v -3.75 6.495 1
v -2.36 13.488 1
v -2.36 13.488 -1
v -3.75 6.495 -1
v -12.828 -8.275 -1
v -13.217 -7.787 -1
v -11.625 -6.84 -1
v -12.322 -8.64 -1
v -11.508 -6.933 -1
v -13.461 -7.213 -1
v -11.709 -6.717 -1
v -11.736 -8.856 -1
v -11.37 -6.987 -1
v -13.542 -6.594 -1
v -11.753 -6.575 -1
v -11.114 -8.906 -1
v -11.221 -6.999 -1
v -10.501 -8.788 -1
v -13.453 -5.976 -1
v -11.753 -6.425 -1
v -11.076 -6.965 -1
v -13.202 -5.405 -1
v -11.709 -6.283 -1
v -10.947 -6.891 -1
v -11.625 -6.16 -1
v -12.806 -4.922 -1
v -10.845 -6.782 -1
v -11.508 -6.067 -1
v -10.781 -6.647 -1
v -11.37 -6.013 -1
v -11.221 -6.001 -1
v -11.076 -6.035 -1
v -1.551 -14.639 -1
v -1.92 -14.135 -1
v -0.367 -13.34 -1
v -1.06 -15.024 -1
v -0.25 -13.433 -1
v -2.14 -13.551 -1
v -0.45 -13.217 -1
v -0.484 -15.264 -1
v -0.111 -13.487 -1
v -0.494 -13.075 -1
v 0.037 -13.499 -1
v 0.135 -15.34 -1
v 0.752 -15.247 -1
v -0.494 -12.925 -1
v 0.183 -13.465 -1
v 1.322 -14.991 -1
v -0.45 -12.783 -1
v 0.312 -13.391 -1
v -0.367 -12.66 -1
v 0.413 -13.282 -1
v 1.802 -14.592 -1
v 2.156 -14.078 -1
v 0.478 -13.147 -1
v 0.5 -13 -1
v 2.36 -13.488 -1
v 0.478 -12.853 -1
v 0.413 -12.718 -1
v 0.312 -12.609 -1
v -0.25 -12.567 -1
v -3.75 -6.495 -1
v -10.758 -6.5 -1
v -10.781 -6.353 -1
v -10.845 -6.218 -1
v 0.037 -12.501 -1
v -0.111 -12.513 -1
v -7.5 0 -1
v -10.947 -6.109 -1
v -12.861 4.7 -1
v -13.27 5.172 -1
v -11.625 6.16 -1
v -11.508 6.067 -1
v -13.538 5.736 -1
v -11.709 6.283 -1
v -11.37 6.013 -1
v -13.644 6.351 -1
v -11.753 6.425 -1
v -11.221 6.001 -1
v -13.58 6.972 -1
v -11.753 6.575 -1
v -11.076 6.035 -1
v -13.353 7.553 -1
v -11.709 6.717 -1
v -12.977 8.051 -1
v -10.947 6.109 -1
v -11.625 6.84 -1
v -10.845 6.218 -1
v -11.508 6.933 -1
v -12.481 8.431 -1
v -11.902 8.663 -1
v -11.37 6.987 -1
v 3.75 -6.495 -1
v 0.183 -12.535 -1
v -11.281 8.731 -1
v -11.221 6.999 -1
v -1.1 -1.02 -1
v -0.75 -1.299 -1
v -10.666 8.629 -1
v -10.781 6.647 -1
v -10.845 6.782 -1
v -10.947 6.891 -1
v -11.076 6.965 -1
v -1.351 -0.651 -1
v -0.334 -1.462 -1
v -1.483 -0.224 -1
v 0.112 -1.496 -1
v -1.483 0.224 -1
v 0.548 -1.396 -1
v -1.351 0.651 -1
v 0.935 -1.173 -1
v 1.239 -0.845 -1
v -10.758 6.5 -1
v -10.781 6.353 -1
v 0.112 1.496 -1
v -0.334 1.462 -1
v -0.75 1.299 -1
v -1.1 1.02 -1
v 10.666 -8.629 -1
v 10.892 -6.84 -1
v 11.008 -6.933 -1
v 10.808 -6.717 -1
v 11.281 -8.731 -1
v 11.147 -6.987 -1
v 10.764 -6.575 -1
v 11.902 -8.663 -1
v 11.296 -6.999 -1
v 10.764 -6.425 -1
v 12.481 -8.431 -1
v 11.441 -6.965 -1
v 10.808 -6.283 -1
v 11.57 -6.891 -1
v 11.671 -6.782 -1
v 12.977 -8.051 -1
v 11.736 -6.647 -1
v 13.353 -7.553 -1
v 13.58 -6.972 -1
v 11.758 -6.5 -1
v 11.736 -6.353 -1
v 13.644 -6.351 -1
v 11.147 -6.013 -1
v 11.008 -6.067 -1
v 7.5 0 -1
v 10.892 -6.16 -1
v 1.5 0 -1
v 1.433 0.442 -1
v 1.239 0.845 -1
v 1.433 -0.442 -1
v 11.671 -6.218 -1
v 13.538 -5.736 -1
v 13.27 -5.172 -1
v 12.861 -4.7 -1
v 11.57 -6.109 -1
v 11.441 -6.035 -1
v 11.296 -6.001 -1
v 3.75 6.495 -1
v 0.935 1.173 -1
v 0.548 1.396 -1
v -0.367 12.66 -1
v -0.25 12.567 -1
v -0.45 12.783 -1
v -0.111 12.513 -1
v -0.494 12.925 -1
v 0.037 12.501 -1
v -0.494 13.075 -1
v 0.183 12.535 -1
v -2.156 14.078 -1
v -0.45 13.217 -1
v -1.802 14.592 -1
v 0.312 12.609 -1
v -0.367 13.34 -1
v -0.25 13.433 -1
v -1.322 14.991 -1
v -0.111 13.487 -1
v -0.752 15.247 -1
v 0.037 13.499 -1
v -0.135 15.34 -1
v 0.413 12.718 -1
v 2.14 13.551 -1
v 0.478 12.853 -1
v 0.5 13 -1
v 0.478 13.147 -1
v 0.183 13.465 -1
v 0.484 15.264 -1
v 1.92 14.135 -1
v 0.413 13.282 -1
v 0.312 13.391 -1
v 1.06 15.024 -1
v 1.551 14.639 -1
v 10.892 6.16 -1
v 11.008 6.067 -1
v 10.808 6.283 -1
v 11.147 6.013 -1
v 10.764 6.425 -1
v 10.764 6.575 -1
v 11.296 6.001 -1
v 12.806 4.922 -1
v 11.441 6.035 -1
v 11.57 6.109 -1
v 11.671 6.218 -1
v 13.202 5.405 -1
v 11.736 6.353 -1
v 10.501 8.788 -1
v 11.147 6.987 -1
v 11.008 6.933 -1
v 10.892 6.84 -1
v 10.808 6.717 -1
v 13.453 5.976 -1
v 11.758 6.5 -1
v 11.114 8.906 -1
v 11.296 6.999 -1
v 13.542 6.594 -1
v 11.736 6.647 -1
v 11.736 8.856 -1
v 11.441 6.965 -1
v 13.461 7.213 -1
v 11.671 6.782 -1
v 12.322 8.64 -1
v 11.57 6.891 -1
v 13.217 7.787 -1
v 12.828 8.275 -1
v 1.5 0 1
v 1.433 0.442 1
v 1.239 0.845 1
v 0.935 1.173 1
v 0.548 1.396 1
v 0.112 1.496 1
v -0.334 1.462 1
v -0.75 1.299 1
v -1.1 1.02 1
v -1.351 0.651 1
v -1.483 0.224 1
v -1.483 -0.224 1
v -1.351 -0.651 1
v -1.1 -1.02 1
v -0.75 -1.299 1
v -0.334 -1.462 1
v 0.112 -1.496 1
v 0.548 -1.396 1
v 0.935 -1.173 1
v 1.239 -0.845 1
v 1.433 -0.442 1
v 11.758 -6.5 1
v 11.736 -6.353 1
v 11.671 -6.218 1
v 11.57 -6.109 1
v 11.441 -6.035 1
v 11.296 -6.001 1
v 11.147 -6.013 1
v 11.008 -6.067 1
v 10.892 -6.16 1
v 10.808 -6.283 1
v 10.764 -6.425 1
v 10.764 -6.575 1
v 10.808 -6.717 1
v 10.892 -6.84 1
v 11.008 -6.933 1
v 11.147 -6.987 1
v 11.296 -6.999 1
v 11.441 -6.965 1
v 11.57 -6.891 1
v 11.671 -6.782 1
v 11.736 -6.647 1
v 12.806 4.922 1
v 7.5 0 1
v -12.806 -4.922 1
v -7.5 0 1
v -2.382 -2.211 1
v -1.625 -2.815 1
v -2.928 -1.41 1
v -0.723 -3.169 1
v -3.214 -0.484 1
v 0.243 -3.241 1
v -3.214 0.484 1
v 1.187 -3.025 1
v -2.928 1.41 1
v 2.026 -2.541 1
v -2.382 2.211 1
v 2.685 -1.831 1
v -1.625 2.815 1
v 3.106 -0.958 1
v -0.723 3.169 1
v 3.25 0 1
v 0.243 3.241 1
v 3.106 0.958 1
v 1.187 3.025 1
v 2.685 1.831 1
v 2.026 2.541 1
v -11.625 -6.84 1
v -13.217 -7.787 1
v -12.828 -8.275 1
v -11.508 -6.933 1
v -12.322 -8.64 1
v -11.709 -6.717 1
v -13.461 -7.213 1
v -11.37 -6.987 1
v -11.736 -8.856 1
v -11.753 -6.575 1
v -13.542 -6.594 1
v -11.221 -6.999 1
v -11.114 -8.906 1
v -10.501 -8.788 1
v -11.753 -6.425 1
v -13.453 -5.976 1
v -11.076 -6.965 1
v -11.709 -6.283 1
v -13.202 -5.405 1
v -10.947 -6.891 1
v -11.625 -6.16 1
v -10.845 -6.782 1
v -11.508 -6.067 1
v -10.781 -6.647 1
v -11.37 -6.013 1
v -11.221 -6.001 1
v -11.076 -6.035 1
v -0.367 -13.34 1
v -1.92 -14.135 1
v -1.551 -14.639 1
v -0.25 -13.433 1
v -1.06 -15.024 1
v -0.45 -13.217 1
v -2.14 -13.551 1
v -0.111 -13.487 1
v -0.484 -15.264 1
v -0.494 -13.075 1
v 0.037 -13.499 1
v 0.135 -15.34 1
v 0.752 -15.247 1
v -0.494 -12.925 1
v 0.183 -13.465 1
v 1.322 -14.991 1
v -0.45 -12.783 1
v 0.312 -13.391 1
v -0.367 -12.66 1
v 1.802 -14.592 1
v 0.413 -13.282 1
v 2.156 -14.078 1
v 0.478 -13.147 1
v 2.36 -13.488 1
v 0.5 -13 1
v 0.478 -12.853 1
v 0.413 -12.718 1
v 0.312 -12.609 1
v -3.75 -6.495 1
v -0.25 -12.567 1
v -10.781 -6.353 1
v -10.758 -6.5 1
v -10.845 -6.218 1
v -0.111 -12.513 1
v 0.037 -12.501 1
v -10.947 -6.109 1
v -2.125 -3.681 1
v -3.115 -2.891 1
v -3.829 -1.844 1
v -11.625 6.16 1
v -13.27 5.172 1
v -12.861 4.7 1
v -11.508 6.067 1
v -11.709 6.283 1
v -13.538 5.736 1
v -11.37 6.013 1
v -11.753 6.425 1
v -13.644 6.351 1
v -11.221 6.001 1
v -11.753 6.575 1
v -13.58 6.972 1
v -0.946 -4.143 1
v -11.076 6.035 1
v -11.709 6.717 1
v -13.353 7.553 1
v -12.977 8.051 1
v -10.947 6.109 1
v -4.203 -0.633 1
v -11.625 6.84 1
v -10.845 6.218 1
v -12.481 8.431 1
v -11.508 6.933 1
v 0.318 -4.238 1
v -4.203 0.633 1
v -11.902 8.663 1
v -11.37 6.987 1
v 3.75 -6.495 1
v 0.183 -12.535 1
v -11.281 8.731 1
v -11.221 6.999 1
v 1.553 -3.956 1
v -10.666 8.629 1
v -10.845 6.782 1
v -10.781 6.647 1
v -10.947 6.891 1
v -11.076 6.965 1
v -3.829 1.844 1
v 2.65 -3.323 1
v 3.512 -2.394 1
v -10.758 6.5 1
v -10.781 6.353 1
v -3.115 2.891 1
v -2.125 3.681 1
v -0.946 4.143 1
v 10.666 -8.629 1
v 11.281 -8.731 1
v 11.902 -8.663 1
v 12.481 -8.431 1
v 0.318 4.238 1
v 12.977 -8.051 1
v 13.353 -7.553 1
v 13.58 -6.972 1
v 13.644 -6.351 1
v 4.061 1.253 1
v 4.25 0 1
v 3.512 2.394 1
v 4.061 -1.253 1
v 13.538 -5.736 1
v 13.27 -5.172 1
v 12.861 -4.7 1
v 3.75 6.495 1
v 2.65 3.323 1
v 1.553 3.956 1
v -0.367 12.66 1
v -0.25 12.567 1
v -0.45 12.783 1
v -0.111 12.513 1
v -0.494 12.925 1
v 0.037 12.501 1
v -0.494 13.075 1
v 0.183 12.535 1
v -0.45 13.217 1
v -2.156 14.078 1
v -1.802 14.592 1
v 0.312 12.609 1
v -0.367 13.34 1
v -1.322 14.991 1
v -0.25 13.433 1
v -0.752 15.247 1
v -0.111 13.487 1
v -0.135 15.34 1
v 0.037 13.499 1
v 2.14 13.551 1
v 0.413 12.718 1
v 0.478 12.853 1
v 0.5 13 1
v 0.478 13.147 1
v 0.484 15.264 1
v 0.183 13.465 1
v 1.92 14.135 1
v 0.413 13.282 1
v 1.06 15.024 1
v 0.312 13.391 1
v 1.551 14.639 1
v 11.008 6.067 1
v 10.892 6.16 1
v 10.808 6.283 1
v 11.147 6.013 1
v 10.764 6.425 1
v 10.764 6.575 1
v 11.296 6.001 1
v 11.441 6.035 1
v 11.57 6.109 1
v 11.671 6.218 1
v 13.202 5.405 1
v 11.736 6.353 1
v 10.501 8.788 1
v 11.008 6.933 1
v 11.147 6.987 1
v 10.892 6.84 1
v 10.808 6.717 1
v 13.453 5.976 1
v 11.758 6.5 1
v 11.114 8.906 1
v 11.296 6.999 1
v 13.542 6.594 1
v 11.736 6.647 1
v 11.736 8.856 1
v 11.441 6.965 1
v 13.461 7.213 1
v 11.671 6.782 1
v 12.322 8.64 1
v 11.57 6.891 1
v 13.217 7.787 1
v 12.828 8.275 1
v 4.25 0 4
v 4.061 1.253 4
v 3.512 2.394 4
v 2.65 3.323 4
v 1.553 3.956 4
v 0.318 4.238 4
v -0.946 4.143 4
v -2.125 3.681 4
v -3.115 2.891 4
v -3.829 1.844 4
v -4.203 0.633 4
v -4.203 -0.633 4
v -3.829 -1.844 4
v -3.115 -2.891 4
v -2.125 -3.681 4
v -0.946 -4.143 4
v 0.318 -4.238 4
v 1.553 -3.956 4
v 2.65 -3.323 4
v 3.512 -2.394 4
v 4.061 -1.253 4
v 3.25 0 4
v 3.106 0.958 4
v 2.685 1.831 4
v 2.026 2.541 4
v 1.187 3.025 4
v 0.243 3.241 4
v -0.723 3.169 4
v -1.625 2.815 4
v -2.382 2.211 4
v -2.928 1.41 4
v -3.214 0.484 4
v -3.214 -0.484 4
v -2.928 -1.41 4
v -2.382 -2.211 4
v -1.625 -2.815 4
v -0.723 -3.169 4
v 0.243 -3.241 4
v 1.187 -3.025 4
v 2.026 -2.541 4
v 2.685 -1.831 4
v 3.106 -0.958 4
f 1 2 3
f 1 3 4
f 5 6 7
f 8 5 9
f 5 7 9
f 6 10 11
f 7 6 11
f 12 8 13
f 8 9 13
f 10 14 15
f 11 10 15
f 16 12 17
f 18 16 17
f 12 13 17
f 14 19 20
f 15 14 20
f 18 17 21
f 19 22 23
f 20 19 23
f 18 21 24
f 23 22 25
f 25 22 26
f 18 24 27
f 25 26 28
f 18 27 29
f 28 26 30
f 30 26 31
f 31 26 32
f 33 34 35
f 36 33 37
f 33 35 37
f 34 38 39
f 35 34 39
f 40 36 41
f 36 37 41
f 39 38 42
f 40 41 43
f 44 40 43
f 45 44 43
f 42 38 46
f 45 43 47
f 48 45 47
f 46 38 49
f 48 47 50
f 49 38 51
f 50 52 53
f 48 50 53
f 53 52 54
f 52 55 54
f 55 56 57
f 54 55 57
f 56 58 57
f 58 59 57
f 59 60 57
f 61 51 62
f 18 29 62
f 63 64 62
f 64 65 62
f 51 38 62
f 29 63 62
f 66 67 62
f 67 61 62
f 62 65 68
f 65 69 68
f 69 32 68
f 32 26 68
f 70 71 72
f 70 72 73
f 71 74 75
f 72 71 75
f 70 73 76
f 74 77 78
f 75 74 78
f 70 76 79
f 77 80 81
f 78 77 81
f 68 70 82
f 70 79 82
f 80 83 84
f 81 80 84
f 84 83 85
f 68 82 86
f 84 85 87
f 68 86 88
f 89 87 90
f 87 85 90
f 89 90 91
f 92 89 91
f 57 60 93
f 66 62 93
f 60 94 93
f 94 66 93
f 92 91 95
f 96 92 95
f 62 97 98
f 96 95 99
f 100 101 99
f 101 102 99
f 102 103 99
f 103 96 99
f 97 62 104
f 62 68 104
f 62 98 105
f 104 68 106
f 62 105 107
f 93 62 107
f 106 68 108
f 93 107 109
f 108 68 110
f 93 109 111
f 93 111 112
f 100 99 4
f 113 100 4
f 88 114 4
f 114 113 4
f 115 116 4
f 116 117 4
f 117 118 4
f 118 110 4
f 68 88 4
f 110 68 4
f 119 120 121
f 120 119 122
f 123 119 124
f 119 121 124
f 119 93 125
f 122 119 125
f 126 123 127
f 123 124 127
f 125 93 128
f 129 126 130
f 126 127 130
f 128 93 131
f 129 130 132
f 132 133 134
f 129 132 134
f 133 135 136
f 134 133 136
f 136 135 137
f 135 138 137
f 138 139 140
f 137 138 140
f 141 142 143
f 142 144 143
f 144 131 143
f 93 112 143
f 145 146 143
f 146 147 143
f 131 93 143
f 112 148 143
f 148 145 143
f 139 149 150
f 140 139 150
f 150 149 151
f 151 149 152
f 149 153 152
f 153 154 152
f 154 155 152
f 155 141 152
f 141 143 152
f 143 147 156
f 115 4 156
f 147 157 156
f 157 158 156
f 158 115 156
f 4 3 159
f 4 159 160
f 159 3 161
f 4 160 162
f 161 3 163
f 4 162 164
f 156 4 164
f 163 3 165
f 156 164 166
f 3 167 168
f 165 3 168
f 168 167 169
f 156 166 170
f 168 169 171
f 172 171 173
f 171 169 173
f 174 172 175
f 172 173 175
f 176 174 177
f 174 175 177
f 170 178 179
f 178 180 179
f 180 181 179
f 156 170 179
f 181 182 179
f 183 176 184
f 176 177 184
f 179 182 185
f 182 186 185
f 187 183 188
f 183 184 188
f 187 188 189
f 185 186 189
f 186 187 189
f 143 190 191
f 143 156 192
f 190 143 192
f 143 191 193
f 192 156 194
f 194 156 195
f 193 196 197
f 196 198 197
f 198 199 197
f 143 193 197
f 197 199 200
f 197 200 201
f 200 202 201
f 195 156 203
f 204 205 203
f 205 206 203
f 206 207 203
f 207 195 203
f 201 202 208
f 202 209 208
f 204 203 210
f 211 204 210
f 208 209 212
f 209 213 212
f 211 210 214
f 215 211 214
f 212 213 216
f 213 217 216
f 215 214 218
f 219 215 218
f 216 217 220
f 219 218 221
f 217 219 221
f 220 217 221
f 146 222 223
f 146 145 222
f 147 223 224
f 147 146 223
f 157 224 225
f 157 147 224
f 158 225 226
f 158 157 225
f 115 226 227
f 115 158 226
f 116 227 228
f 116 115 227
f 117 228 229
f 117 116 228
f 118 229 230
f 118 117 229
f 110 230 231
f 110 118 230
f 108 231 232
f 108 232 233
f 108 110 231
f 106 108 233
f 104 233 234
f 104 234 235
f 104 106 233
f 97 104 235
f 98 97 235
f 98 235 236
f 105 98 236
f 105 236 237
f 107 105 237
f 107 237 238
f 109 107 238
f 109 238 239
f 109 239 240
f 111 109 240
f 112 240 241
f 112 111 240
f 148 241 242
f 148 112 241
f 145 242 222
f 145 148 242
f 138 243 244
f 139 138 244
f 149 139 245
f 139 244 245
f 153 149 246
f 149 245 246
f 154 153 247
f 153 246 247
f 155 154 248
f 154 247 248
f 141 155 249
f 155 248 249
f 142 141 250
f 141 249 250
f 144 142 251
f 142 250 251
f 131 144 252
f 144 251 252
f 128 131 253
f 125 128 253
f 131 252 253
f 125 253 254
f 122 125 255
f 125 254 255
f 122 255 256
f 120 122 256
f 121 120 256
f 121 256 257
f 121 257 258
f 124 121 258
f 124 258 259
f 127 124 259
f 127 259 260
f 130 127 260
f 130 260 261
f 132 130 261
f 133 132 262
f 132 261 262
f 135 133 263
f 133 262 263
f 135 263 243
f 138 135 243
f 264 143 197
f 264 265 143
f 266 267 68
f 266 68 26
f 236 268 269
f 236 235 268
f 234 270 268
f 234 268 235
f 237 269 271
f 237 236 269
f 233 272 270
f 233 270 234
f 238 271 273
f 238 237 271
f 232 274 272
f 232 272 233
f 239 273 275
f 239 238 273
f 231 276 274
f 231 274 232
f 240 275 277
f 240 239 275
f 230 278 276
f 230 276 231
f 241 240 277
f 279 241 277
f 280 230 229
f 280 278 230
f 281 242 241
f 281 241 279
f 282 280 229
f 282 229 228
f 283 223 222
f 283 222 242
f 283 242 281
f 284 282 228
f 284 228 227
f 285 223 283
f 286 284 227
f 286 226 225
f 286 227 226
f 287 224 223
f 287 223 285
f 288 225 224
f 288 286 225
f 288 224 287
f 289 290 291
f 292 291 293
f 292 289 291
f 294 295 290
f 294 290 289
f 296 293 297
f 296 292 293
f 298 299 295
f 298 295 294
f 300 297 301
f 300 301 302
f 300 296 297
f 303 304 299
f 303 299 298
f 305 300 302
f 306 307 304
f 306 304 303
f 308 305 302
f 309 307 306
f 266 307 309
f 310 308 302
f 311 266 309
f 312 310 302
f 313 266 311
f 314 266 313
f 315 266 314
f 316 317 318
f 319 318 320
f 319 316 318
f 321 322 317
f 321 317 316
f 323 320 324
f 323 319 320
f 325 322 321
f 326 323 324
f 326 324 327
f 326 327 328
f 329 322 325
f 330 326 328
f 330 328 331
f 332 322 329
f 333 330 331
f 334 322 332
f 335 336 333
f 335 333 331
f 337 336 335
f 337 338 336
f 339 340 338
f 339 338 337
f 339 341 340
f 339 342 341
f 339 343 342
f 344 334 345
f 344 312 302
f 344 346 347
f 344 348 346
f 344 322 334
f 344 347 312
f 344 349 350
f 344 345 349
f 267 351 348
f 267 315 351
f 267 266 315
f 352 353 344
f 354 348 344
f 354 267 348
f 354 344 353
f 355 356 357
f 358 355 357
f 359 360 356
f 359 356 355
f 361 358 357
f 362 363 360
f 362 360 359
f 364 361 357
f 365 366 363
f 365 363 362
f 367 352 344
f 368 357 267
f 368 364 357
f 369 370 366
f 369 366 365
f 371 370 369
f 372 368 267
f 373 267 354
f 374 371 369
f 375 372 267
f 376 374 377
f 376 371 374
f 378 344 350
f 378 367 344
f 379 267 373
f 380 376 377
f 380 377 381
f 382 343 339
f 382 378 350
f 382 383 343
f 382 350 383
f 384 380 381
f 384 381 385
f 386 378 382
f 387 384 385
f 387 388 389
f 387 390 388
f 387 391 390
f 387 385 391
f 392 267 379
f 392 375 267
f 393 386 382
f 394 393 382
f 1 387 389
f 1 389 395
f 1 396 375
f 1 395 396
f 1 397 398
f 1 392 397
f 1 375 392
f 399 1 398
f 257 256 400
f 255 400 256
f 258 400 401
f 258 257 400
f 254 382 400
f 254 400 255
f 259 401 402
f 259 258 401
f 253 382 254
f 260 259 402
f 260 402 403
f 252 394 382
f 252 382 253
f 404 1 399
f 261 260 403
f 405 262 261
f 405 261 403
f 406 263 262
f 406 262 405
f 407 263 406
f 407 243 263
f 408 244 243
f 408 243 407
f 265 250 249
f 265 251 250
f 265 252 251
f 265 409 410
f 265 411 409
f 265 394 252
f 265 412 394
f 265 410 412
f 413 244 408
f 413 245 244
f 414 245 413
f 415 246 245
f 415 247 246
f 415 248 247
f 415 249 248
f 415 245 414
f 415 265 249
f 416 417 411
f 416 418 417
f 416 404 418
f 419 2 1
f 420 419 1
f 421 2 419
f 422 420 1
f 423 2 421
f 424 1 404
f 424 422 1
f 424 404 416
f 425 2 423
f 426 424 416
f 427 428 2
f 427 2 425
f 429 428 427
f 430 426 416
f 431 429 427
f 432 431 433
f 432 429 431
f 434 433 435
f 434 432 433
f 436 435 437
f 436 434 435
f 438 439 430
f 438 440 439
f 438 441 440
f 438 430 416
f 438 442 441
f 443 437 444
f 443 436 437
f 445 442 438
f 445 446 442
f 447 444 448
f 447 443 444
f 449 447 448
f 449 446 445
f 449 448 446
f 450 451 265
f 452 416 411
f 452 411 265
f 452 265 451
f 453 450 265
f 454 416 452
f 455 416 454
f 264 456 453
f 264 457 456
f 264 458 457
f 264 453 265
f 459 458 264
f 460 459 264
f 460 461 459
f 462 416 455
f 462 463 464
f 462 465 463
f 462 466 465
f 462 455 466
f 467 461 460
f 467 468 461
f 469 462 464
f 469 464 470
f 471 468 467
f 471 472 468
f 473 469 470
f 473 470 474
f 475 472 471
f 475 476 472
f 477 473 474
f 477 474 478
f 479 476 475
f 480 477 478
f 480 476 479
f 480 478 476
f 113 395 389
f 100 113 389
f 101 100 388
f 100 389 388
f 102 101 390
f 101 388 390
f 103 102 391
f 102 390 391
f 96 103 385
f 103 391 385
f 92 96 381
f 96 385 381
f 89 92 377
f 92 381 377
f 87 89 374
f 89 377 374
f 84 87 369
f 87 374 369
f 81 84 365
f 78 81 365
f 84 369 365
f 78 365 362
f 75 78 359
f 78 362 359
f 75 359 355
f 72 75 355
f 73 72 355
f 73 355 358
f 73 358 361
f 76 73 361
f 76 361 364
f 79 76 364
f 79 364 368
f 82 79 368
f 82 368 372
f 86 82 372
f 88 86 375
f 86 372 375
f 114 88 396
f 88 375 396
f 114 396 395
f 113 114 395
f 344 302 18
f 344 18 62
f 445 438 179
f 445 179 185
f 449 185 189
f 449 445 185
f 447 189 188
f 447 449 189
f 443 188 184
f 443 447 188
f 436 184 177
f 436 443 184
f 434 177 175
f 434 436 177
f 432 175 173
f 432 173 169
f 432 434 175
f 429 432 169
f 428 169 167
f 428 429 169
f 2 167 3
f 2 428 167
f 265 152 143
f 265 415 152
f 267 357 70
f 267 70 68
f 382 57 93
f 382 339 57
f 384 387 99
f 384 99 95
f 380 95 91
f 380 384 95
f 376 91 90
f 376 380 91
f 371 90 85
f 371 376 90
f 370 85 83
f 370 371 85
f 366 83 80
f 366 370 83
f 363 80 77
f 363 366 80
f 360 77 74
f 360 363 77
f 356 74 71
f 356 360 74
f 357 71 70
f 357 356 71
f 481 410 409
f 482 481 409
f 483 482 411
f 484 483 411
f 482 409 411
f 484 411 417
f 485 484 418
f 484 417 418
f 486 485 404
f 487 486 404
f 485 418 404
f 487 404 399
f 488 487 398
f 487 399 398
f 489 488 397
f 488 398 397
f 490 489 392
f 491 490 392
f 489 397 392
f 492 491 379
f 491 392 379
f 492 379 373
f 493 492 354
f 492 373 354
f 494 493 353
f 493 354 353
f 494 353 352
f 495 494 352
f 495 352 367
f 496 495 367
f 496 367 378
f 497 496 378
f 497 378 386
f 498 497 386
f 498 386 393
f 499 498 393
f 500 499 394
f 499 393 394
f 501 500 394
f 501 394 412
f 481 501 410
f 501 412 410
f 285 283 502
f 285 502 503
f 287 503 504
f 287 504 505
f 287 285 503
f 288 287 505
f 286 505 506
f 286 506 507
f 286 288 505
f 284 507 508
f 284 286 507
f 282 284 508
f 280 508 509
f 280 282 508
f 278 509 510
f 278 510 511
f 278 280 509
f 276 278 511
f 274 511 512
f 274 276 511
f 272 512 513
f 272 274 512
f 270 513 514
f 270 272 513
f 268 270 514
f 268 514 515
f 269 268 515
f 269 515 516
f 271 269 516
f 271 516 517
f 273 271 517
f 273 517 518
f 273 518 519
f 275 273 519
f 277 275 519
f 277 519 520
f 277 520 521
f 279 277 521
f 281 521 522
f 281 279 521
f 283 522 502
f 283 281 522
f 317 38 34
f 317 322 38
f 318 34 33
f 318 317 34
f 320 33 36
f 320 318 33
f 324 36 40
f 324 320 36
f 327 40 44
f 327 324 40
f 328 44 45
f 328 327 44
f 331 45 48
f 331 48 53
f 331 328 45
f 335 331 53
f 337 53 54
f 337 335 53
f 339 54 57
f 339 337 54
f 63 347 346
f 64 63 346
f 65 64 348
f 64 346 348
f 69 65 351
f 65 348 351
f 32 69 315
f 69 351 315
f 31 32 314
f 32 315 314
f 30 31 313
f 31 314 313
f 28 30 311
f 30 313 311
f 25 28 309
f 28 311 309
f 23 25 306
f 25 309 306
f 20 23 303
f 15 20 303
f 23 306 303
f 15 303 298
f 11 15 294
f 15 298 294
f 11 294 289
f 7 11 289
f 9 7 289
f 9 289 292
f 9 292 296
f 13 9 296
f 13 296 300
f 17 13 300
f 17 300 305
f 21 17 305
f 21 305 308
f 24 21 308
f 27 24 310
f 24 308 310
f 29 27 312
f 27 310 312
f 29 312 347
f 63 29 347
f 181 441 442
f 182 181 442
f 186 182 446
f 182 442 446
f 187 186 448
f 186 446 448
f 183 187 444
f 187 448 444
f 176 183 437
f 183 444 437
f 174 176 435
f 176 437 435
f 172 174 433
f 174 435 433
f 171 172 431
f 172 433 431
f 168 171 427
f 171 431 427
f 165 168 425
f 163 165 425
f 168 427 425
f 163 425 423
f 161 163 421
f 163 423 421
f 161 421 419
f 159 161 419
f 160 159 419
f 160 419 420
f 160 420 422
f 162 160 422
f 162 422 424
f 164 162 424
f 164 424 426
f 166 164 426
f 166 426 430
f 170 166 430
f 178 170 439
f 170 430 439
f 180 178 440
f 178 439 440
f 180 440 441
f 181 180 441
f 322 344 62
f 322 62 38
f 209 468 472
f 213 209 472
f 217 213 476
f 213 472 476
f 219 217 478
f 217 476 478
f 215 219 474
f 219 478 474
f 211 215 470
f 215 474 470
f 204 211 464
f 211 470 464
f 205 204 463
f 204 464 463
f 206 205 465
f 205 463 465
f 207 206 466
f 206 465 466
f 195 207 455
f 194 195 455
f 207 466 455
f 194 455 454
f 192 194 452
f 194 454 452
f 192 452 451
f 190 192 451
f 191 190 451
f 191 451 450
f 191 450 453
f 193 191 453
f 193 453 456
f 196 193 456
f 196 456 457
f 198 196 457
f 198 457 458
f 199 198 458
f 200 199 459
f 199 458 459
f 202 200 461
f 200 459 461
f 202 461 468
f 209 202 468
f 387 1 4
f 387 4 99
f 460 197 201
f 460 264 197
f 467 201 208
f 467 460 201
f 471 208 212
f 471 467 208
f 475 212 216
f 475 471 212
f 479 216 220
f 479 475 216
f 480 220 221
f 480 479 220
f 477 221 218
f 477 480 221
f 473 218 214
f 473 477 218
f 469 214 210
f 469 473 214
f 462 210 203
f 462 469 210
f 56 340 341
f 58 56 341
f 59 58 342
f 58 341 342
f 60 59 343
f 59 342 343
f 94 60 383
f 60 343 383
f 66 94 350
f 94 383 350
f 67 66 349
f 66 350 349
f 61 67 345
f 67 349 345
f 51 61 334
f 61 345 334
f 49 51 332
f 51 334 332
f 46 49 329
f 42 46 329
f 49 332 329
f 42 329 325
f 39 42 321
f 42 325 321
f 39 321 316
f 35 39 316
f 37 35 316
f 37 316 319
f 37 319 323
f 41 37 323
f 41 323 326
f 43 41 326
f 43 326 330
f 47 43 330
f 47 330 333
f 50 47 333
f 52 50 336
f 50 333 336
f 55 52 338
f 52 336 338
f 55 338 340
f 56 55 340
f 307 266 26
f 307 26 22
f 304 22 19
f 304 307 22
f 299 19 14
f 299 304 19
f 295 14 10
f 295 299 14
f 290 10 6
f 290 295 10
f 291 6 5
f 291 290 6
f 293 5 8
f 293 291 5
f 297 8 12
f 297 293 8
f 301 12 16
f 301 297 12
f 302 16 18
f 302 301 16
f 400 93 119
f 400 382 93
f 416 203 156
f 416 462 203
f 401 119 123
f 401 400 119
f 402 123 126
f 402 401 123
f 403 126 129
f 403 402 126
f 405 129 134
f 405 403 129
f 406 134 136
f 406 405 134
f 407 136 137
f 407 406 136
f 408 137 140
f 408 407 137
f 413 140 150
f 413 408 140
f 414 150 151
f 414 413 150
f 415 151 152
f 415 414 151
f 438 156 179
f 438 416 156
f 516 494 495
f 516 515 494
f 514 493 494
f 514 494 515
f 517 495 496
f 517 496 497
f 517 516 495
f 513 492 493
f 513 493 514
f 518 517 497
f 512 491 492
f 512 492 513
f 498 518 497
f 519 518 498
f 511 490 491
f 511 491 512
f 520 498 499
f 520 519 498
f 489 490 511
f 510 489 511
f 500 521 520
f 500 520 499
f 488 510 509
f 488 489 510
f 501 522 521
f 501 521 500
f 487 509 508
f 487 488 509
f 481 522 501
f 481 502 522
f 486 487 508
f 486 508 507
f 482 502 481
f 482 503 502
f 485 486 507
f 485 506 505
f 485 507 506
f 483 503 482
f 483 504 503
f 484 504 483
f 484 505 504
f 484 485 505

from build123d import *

# Parameters (mm, degrees)
ESBO_O1_R                = 1.5
RESSALTO_EXTRUS_O1_DEPTH = 1
ESBO_O2_R                = 4.25
ESBO_O2_R_2              = 3.25
RESSALTO_EXTRUS_O2_DEPTH = 3
ESBO_O3_R                = 0.5
CORTE_EXTRUS_O1_DEPTH    = 2


with BuildPart() as part:
    # Esboço1 → Ressalto-extrusão1 (new body, symmetric)
    with BuildSketch(Plane.XY):
        with BuildLine():
            Line((3.75, 6.495190528), (2.140193877, 13.55121581))
            ThreePointArc((2.140193877, 13.55121581), (-0.135352736, 15.340099778), (-2.359806123, 13.488067011))
            Line((-2.359806123, 13.488067011), (-3.75, 6.495190528))
            Line((-3.75, 6.495190528), (-10.665600205, 8.629070172))
            ThreePointArc((-10.665600205, 8.629070172), (-13.352592472, 7.552830981), (-12.86091174, 4.700381455))
            Line((-12.86091174, 4.700381455), (-7.5, 0))
            Line((-7.5, 0), (-12.805794082, -4.922145638))
            ThreePointArc((-12.805794082, -4.922145638), (-13.217239736, -7.787268797), (-10.501105618, -8.787685556))
            Line((-10.501105618, -8.787685556), (-3.75, -6.495190528))
            Line((-3.75, -6.495190528), (-2.140193877, -13.55121581))
            ThreePointArc((-2.140193877, -13.55121581), (0.135352736, -15.340099778), (2.359806123, -13.488067011))
            Line((2.359806123, -13.488067011), (3.75, -6.495190528))
            Line((3.75, -6.495190528), (10.665600205, -8.629070172))
            ThreePointArc((10.665600205, -8.629070172), (13.352592472, -7.552830981), (12.86091174, -4.700381455))
            Line((12.86091174, -4.700381455), (7.5, 0))
            Line((7.5, 0), (12.805794082, 4.922145638))
            ThreePointArc((12.805794082, 4.922145638), (13.217239736, 7.787268797), (10.501105618, 8.787685556))
            Line((10.501105618, 8.787685556), (3.75, 6.495190528))
        make_face()
        Circle(ESBO_O1_R, mode=Mode.SUBTRACT)
    extrude(amount=RESSALTO_EXTRUS_O1_DEPTH, both=True)

    # Esboço2 → Ressalto-extrusão2 (add)
    with BuildSketch(Plane.XY.offset(1)):
        Circle(ESBO_O2_R)
        Circle(ESBO_O2_R_2, mode=Mode.SUBTRACT)
    extrude(amount=RESSALTO_EXTRUS_O2_DEPTH)

    # Esboço3 → Corte-extrusão1 (cut)
    with BuildSketch(Plane.XY.offset(1)):
        with Locations((0, 13)):
            Circle(ESBO_O3_R)
        with Locations((11.258330249, 6.5)):
            Circle(ESBO_O3_R)
        with Locations((11.258330249, -6.5)):
            Circle(ESBO_O3_R)
        with Locations((0, -13)):
            Circle(ESBO_O3_R)
        with Locations((-11.258330249, -6.5)):
            Circle(ESBO_O3_R)
        with Locations((-11.258330249, 6.5)):
            Circle(ESBO_O3_R)
    extrude(amount=-CORTE_EXTRUS_O1_DEPTH, mode=Mode.SUBTRACT)


solid = part.part
